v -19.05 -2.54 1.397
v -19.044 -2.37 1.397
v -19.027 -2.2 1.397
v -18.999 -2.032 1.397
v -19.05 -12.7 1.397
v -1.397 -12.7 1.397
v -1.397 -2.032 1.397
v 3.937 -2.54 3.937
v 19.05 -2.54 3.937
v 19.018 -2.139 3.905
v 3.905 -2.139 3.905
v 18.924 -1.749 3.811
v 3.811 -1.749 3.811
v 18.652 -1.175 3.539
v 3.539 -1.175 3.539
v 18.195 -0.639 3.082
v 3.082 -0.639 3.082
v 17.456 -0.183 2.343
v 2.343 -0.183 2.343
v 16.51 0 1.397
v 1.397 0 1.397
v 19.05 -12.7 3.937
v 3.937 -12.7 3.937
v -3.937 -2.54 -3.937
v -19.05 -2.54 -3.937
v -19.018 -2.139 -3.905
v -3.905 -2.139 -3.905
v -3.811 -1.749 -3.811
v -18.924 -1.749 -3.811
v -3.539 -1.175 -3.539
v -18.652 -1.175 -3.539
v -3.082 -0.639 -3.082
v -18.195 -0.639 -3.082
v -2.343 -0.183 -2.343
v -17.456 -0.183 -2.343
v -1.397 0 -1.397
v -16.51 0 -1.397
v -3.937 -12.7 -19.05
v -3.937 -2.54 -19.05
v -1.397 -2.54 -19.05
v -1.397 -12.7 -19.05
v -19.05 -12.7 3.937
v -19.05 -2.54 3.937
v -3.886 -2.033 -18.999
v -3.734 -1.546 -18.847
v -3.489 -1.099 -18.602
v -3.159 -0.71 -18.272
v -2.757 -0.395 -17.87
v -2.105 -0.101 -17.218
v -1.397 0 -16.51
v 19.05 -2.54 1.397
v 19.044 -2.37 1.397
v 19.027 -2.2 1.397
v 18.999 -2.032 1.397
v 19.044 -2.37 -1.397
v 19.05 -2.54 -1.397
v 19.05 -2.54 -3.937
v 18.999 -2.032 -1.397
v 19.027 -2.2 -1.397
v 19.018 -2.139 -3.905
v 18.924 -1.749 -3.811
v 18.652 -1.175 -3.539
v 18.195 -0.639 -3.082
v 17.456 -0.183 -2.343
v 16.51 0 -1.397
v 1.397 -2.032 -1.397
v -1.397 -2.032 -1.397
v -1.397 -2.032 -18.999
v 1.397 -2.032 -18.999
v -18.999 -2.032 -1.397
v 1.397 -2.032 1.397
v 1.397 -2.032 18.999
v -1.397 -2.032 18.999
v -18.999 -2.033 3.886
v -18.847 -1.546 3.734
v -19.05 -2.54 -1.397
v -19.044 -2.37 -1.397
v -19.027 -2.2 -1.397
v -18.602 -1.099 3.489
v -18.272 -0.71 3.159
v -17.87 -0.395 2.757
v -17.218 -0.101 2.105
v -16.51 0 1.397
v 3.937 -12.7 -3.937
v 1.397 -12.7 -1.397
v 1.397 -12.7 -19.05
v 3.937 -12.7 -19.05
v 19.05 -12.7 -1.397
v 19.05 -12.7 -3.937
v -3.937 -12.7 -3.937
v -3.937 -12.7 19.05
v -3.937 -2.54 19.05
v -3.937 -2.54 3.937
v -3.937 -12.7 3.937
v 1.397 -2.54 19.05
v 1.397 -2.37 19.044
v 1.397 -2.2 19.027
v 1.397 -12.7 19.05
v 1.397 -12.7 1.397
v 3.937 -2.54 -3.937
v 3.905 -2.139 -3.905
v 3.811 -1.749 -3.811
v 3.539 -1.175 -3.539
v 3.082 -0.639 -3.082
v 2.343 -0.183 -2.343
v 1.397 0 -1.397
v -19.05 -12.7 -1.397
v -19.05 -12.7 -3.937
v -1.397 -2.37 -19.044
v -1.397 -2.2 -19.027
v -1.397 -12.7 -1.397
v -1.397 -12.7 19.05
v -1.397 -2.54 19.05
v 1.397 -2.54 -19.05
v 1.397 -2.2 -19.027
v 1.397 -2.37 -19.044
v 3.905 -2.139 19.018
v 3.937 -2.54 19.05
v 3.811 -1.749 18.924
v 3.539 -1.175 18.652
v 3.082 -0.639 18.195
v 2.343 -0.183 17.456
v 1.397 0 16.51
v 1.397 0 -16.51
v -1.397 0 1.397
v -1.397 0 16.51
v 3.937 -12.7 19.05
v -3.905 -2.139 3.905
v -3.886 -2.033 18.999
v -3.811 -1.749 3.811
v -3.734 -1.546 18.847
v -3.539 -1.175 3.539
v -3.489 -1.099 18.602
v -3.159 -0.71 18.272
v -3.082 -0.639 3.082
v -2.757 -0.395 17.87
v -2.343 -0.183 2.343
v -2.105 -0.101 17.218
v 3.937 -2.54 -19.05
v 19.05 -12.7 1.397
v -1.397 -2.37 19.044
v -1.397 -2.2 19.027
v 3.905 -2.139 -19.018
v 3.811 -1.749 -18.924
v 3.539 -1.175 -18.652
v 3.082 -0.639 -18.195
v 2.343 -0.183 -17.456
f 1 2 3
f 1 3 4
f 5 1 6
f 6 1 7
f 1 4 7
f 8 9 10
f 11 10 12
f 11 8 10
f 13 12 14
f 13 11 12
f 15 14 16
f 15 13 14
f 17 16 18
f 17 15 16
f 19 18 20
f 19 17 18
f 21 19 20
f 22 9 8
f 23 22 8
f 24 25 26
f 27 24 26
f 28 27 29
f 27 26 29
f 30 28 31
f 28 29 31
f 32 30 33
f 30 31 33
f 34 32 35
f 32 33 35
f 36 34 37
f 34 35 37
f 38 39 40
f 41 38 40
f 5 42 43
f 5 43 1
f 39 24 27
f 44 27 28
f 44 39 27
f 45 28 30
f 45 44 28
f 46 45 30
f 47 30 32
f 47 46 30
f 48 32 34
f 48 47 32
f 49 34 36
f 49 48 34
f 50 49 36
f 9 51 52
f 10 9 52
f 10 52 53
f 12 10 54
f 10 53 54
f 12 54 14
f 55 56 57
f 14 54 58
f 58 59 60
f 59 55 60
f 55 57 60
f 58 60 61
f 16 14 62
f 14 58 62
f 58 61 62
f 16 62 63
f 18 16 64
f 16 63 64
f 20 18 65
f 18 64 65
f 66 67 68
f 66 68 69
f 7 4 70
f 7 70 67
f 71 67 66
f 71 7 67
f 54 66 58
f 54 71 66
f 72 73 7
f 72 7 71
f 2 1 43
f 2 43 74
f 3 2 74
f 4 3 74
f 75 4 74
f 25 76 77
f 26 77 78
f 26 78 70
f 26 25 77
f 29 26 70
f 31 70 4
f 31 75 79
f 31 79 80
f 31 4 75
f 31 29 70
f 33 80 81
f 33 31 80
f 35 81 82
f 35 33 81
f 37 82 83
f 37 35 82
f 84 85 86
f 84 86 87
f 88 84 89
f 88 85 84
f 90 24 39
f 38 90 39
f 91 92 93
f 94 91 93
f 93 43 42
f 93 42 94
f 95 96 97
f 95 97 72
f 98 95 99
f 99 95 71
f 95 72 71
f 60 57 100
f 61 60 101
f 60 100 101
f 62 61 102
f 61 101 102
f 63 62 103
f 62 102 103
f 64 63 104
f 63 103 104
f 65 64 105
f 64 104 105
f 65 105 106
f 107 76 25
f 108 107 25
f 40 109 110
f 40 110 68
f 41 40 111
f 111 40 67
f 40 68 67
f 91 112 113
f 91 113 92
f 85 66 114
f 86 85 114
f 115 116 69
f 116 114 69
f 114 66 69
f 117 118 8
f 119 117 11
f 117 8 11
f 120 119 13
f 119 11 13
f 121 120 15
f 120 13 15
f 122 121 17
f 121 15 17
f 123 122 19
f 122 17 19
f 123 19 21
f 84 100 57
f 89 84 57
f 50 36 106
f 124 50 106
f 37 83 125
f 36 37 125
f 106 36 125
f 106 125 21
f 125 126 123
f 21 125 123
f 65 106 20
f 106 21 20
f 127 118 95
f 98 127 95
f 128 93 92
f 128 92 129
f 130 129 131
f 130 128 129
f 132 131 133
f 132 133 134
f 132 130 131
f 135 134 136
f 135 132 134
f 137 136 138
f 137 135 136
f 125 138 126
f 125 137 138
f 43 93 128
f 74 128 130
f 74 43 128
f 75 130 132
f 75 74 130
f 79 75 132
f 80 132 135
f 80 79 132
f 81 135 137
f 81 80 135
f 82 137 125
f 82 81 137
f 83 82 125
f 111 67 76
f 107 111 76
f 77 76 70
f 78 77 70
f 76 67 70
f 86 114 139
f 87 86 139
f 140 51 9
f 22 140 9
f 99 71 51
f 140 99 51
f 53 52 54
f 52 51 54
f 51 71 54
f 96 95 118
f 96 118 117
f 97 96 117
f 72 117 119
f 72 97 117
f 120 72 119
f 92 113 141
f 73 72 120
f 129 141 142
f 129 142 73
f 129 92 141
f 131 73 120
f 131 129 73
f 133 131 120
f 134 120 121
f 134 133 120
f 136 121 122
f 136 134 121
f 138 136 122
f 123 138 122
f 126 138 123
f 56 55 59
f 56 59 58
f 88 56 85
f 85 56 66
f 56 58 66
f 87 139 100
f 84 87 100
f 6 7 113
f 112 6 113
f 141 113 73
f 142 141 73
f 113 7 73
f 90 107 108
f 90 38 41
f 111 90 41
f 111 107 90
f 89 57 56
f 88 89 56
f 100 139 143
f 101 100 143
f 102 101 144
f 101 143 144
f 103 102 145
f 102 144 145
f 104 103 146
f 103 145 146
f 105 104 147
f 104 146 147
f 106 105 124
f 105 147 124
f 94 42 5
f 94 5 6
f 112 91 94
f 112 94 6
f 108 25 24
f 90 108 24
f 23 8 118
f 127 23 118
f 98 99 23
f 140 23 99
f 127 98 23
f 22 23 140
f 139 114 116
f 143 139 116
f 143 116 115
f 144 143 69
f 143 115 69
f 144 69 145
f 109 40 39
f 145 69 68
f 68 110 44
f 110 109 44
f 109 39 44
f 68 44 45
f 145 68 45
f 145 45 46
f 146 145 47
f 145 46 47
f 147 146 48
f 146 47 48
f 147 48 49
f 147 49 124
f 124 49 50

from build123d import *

# Parameters (mm, degrees)
F1_DEPTH     = 2.032
F2_DEPTH     = 12.7
F3_T1_DEPTH  = 21.463
F3_T3_DEPTH  = 21.463
F3_T5_DEPTH  = 20.574
F3_T7_DEPTH  = 21.463
F3_T9_DEPTH  = 20.574
F3_T11_DEPTH = 21.463
F3_T17_DEPTH = 27.813
F3_T21_DEPTH = 27.813
F3_T28_DEPTH = 27.813
F3_T32_DEPTH = 27.813
F3_T39_DEPTH = 27.813
F3_T43_DEPTH = 27.813
F3_T50_DEPTH = 27.813
F3_T54_DEPTH = 27.813


# Not quite as in the source:
# - a fillet or chamfer that OpenCascade refuses, or shapes differently, is made with other operations: its cross-section is extruded or revolved along the edge and cut away or added


with BuildPart() as f1:
    # F0 (on Front) → F1 (new body)
    with BuildSketch(Plane.XZ):
        Polygon((1.397, 19.05), (-1.397, 19.05), (-1.397, 1.397), (-19.05, 1.397), (-19.05, -1.397), (-1.397, -1.397), (-1.397, -19.05), (1.397, -19.05), (1.397, -1.397), (19.05, -1.397), (19.05, 1.397), (1.397, 1.397), align=None)
    extrude(amount=F1_DEPTH)

    # F0 (on Front) → F2 (join)
    with BuildSketch(Plane.XZ):
        Polygon((-1.397, 19.05), (-3.937, 19.05), (-3.937, 3.937), (-19.05, 3.937), (-19.05, 1.397), (-1.397, 1.397), align=None)
        Polygon((3.937, 19.05), (1.397, 19.05), (1.397, 1.397), (19.05, 1.397), (19.05, 3.937), (3.937, 3.937), align=None)
        Polygon((-1.397, -1.397), (-19.05, -1.397), (-19.05, -3.937), (-3.937, -3.937), (-3.937, -19.05), (-1.397, -19.05), align=None)
        Polygon((19.05, -3.937), (19.05, -1.397), (1.397, -1.397), (1.397, -19.05), (3.937, -19.05), (3.937, -3.937), align=None)
    extrude(amount=F2_DEPTH)

    # F3: fillet of radius 2.54 on 12 edges, made by hand

    # F3_s2 → F3_t1 (cut)
    with BuildSketch(Plane.XY.offset(3.937)):
        with BuildLine():
            ThreePointArc((-3.937, -2.54), (-3.1930512242, -0.7439487758), (-1.397, 0))
            Line((-1.397, 0), (-3.937, 0))
            Line((-3.937, 0), (-3.937, -2.54))
        make_face()
        with BuildLine():
            ThreePointArc((3.937, -2.54), (3.1930512242, -0.7439487758), (1.397, 0))
            Line((1.397, 0), (3.937, 0))
            Line((3.937, 0), (3.937, -2.54))
        make_face()
    extrude(amount=F3_T1_DEPTH, mode=Mode.SUBTRACT)

    # F3_s4 → F3_t3 (cut)
    with BuildSketch(Plane.YZ.offset(-25.4)):
        with BuildLine():
            ThreePointArc((-2.54, 3.937), (-0.7439487758, 3.1930512242), (0, 1.397))
            Line((0, 1.397), (0, 3.937))
            Line((0, 3.937), (-2.54, 3.937))
        make_face()
        with BuildLine():
            ThreePointArc((-2.54, -3.937), (-0.7439487758, -3.1930512242), (0, -1.397))
            Line((0, -1.397), (0, -3.937))
            Line((0, -3.937), (-2.54, -3.937))
        make_face()
    extrude(amount=F3_T3_DEPTH, mode=Mode.SUBTRACT)

    # F3_s6 → F3_t5 (cut)
    with BuildSketch(Plane.XY.offset(-10.287)):
        with BuildLine():
            ThreePointArc((-19.05, -2.54), (-18.3060512242, -0.7439487758), (-16.51, 0))
            Line((-16.51, 0), (-19.05, 0))
            Line((-19.05, 0), (-19.05, -2.54))
        make_face()
        with BuildLine():
            ThreePointArc((19.05, -2.54), (18.3060512242, -0.7439487758), (16.51, 0))
            Line((16.51, 0), (19.05, 0))
            Line((19.05, 0), (19.05, -2.54))
        make_face()
    extrude(amount=F3_T5_DEPTH, mode=Mode.SUBTRACT)

    # F3_s8 → F3_t7 (cut)
    with BuildSketch(Plane.XY.offset(-25.4)):
        with BuildLine():
            ThreePointArc((-3.937, -2.54), (-3.1930512242, -0.7439487758), (-1.397, 0))
            Line((-1.397, 0), (-3.937, 0))
            Line((-3.937, 0), (-3.937, -2.54))
        make_face()
        with BuildLine():
            ThreePointArc((3.937, -2.54), (3.1930512242, -0.7439487758), (1.397, 0))
            Line((1.397, 0), (3.937, 0))
            Line((3.937, 0), (3.937, -2.54))
        make_face()
    extrude(amount=F3_T7_DEPTH, mode=Mode.SUBTRACT)

    # F3_s10 → F3_t9 (cut)
    with BuildSketch(Plane.YZ.offset(-10.287)):
        with BuildLine():
            ThreePointArc((-2.54, -19.05), (-0.7439487758, -18.3060512242), (0, -16.51))
            Line((0, -16.51), (0, -19.05))
            Line((0, -19.05), (-2.54, -19.05))
        make_face()
        with BuildLine():
            ThreePointArc((-2.54, 19.05), (-0.7439487758, 18.3060512242), (0, 16.51))
            Line((0, 16.51), (0, 19.05))
            Line((0, 19.05), (-2.54, 19.05))
        make_face()
    extrude(amount=F3_T9_DEPTH, mode=Mode.SUBTRACT)

    # F3_s12 → F3_t11 (cut)
    with BuildSketch(Plane.YZ.offset(3.937)):
        with BuildLine():
            ThreePointArc((-2.54, -3.937), (-0.7439487758, -3.1930512242), (0, -1.397))
            Line((0, -1.397), (0, -3.937))
            Line((0, -3.937), (-2.54, -3.937))
        make_face()
        with BuildLine():
            ThreePointArc((-2.54, 3.937), (-0.7439487758, 3.1930512242), (0, 1.397))
            Line((0, 1.397), (0, 3.937))
            Line((0, 3.937), (-2.54, 3.937))
        make_face()
    extrude(amount=F3_T11_DEPTH, mode=Mode.SUBTRACT)


with BuildPart() as f3_tool15:
    # F3_s16 → F3_t17 (new body)
    with BuildSketch(Plane.XY.offset(25.4)):
        with BuildLine():
            ThreePointArc((-3.937, -2.54), (-3.1930512242, -0.7439487758), (-1.397, 0))
            Line((-1.397, 0), (-3.937, 0))
            Line((-3.937, 0), (-3.937, -2.54))
        make_face()
    extrude(amount=-F3_T17_DEPTH)

    split(bisect_by=Plane.XY.offset(3.937), keep=Keep.BOTTOM)


with BuildPart() as f3_tool19:
    # F3_s20 → F3_t21 (new body)
    with BuildSketch(Plane.YZ.offset(2.413)):
        with BuildLine():
            ThreePointArc((-2.54, 3.937), (-0.7439487758, 3.1930512242), (0, 1.397))
            Line((0, 1.397), (0, 3.937))
            Line((0, 3.937), (-2.54, 3.937))
        make_face()
    extrude(amount=-F3_T21_DEPTH)

    split(bisect_by=Plane.YZ.offset(-3.937), keep=Keep.TOP)


with BuildPart() as f3_tool15_1:
    add(f3_tool15.part)

    # F3_t23: intersect F3_tool19
    add(f3_tool19.part, mode=Mode.INTERSECT)


with BuildPart() as f1_1:
    add(f1.part)

    # F3_t13: cut F3_tool15
    add(f3_tool15_1.part, mode=Mode.SUBTRACT)


with BuildPart() as f3_tool26:
    # F3_s27 → F3_t28 (new body)
    with BuildSketch(Plane.YZ.offset(-25.4)):
        with BuildLine():
            ThreePointArc((-2.54, -3.937), (-0.7439487758, -3.1930512242), (0, -1.397))
            Line((0, -1.397), (0, -3.937))
            Line((0, -3.937), (-2.54, -3.937))
        make_face()
    extrude(amount=F3_T28_DEPTH)

    split(bisect_by=Plane.YZ.offset(-3.937), keep=Keep.TOP)


with BuildPart() as f3_tool30:
    # F3_s31 → F3_t32 (new body)
    with BuildSketch(Plane.XY.offset(2.413)):
        with BuildLine():
            ThreePointArc((-3.937, -2.54), (-3.1930512242, -0.7439487758), (-1.397, 0))
            Line((-1.397, 0), (-3.937, 0))
            Line((-3.937, 0), (-3.937, -2.54))
        make_face()
    extrude(amount=-F3_T32_DEPTH)

    split(bisect_by=Plane.XY.offset(-3.937), keep=Keep.TOP)


with BuildPart() as f3_tool26_1:
    add(f3_tool26.part)

    # F3_t34: intersect F3_tool30
    add(f3_tool30.part, mode=Mode.INTERSECT)


with BuildPart() as f1_2:
    add(f1_1.part)

    # F3_t24: cut F3_tool26
    add(f3_tool26_1.part, mode=Mode.SUBTRACT)


with BuildPart() as f3_tool37:
    # F3_s38 → F3_t39 (new body)
    with BuildSketch(Plane.XY.offset(-25.4)):
        with BuildLine():
            ThreePointArc((3.937, -2.54), (3.1930512242, -0.7439487758), (1.397, 0))
            Line((1.397, 0), (3.937, 0))
            Line((3.937, 0), (3.937, -2.54))
        make_face()
    extrude(amount=F3_T39_DEPTH)

    split(bisect_by=Plane.XY.offset(-3.937), keep=Keep.TOP)


with BuildPart() as f3_tool41:
    # F3_s42 → F3_t43 (new body)
    with BuildSketch(Plane.YZ.offset(-2.413)):
        with BuildLine():
            ThreePointArc((-2.54, -3.937), (-0.7439487758, -3.1930512242), (0, -1.397))
            Line((0, -1.397), (0, -3.937))
            Line((0, -3.937), (-2.54, -3.937))
        make_face()
    extrude(amount=F3_T43_DEPTH)

    split(bisect_by=Plane.YZ.offset(3.937), keep=Keep.BOTTOM)


with BuildPart() as f3_tool37_1:
    add(f3_tool37.part)

    # F3_t45: intersect F3_tool41
    add(f3_tool41.part, mode=Mode.INTERSECT)


with BuildPart() as f1_3:
    add(f1_2.part)

    # F3_t35: cut F3_tool37
    add(f3_tool37_1.part, mode=Mode.SUBTRACT)


with BuildPart() as f3_tool48:
    # F3_s49 → F3_t50 (new body)
    with BuildSketch(Plane.YZ.offset(25.4)):
        with BuildLine():
            ThreePointArc((-2.54, 3.937), (-0.7439487758, 3.1930512242), (0, 1.397))
            Line((0, 1.397), (0, 3.937))
            Line((0, 3.937), (-2.54, 3.937))
        make_face()
    extrude(amount=-F3_T50_DEPTH)

    split(bisect_by=Plane.YZ.offset(3.937), keep=Keep.BOTTOM)


with BuildPart() as f3_tool52:
    # F3_s53 → F3_t54 (new body)
    with BuildSketch(Plane.XY.offset(-2.413)):
        with BuildLine():
            ThreePointArc((3.937, -2.54), (3.1930512242, -0.7439487758), (1.397, 0))
            Line((1.397, 0), (3.937, 0))
            Line((3.937, 0), (3.937, -2.54))
        make_face()
    extrude(amount=F3_T54_DEPTH)

    split(bisect_by=Plane.XY.offset(3.937), keep=Keep.BOTTOM)


with BuildPart() as f3_tool48_1:
    add(f3_tool48.part)

    # F3_t56: intersect F3_tool52
    add(f3_tool52.part, mode=Mode.INTERSECT)


with BuildPart() as f1_4:
    add(f1_3.part)

    # F3_t46: cut F3_tool48
    add(f3_tool48_1.part, mode=Mode.SUBTRACT)


solid = f1_4.part
